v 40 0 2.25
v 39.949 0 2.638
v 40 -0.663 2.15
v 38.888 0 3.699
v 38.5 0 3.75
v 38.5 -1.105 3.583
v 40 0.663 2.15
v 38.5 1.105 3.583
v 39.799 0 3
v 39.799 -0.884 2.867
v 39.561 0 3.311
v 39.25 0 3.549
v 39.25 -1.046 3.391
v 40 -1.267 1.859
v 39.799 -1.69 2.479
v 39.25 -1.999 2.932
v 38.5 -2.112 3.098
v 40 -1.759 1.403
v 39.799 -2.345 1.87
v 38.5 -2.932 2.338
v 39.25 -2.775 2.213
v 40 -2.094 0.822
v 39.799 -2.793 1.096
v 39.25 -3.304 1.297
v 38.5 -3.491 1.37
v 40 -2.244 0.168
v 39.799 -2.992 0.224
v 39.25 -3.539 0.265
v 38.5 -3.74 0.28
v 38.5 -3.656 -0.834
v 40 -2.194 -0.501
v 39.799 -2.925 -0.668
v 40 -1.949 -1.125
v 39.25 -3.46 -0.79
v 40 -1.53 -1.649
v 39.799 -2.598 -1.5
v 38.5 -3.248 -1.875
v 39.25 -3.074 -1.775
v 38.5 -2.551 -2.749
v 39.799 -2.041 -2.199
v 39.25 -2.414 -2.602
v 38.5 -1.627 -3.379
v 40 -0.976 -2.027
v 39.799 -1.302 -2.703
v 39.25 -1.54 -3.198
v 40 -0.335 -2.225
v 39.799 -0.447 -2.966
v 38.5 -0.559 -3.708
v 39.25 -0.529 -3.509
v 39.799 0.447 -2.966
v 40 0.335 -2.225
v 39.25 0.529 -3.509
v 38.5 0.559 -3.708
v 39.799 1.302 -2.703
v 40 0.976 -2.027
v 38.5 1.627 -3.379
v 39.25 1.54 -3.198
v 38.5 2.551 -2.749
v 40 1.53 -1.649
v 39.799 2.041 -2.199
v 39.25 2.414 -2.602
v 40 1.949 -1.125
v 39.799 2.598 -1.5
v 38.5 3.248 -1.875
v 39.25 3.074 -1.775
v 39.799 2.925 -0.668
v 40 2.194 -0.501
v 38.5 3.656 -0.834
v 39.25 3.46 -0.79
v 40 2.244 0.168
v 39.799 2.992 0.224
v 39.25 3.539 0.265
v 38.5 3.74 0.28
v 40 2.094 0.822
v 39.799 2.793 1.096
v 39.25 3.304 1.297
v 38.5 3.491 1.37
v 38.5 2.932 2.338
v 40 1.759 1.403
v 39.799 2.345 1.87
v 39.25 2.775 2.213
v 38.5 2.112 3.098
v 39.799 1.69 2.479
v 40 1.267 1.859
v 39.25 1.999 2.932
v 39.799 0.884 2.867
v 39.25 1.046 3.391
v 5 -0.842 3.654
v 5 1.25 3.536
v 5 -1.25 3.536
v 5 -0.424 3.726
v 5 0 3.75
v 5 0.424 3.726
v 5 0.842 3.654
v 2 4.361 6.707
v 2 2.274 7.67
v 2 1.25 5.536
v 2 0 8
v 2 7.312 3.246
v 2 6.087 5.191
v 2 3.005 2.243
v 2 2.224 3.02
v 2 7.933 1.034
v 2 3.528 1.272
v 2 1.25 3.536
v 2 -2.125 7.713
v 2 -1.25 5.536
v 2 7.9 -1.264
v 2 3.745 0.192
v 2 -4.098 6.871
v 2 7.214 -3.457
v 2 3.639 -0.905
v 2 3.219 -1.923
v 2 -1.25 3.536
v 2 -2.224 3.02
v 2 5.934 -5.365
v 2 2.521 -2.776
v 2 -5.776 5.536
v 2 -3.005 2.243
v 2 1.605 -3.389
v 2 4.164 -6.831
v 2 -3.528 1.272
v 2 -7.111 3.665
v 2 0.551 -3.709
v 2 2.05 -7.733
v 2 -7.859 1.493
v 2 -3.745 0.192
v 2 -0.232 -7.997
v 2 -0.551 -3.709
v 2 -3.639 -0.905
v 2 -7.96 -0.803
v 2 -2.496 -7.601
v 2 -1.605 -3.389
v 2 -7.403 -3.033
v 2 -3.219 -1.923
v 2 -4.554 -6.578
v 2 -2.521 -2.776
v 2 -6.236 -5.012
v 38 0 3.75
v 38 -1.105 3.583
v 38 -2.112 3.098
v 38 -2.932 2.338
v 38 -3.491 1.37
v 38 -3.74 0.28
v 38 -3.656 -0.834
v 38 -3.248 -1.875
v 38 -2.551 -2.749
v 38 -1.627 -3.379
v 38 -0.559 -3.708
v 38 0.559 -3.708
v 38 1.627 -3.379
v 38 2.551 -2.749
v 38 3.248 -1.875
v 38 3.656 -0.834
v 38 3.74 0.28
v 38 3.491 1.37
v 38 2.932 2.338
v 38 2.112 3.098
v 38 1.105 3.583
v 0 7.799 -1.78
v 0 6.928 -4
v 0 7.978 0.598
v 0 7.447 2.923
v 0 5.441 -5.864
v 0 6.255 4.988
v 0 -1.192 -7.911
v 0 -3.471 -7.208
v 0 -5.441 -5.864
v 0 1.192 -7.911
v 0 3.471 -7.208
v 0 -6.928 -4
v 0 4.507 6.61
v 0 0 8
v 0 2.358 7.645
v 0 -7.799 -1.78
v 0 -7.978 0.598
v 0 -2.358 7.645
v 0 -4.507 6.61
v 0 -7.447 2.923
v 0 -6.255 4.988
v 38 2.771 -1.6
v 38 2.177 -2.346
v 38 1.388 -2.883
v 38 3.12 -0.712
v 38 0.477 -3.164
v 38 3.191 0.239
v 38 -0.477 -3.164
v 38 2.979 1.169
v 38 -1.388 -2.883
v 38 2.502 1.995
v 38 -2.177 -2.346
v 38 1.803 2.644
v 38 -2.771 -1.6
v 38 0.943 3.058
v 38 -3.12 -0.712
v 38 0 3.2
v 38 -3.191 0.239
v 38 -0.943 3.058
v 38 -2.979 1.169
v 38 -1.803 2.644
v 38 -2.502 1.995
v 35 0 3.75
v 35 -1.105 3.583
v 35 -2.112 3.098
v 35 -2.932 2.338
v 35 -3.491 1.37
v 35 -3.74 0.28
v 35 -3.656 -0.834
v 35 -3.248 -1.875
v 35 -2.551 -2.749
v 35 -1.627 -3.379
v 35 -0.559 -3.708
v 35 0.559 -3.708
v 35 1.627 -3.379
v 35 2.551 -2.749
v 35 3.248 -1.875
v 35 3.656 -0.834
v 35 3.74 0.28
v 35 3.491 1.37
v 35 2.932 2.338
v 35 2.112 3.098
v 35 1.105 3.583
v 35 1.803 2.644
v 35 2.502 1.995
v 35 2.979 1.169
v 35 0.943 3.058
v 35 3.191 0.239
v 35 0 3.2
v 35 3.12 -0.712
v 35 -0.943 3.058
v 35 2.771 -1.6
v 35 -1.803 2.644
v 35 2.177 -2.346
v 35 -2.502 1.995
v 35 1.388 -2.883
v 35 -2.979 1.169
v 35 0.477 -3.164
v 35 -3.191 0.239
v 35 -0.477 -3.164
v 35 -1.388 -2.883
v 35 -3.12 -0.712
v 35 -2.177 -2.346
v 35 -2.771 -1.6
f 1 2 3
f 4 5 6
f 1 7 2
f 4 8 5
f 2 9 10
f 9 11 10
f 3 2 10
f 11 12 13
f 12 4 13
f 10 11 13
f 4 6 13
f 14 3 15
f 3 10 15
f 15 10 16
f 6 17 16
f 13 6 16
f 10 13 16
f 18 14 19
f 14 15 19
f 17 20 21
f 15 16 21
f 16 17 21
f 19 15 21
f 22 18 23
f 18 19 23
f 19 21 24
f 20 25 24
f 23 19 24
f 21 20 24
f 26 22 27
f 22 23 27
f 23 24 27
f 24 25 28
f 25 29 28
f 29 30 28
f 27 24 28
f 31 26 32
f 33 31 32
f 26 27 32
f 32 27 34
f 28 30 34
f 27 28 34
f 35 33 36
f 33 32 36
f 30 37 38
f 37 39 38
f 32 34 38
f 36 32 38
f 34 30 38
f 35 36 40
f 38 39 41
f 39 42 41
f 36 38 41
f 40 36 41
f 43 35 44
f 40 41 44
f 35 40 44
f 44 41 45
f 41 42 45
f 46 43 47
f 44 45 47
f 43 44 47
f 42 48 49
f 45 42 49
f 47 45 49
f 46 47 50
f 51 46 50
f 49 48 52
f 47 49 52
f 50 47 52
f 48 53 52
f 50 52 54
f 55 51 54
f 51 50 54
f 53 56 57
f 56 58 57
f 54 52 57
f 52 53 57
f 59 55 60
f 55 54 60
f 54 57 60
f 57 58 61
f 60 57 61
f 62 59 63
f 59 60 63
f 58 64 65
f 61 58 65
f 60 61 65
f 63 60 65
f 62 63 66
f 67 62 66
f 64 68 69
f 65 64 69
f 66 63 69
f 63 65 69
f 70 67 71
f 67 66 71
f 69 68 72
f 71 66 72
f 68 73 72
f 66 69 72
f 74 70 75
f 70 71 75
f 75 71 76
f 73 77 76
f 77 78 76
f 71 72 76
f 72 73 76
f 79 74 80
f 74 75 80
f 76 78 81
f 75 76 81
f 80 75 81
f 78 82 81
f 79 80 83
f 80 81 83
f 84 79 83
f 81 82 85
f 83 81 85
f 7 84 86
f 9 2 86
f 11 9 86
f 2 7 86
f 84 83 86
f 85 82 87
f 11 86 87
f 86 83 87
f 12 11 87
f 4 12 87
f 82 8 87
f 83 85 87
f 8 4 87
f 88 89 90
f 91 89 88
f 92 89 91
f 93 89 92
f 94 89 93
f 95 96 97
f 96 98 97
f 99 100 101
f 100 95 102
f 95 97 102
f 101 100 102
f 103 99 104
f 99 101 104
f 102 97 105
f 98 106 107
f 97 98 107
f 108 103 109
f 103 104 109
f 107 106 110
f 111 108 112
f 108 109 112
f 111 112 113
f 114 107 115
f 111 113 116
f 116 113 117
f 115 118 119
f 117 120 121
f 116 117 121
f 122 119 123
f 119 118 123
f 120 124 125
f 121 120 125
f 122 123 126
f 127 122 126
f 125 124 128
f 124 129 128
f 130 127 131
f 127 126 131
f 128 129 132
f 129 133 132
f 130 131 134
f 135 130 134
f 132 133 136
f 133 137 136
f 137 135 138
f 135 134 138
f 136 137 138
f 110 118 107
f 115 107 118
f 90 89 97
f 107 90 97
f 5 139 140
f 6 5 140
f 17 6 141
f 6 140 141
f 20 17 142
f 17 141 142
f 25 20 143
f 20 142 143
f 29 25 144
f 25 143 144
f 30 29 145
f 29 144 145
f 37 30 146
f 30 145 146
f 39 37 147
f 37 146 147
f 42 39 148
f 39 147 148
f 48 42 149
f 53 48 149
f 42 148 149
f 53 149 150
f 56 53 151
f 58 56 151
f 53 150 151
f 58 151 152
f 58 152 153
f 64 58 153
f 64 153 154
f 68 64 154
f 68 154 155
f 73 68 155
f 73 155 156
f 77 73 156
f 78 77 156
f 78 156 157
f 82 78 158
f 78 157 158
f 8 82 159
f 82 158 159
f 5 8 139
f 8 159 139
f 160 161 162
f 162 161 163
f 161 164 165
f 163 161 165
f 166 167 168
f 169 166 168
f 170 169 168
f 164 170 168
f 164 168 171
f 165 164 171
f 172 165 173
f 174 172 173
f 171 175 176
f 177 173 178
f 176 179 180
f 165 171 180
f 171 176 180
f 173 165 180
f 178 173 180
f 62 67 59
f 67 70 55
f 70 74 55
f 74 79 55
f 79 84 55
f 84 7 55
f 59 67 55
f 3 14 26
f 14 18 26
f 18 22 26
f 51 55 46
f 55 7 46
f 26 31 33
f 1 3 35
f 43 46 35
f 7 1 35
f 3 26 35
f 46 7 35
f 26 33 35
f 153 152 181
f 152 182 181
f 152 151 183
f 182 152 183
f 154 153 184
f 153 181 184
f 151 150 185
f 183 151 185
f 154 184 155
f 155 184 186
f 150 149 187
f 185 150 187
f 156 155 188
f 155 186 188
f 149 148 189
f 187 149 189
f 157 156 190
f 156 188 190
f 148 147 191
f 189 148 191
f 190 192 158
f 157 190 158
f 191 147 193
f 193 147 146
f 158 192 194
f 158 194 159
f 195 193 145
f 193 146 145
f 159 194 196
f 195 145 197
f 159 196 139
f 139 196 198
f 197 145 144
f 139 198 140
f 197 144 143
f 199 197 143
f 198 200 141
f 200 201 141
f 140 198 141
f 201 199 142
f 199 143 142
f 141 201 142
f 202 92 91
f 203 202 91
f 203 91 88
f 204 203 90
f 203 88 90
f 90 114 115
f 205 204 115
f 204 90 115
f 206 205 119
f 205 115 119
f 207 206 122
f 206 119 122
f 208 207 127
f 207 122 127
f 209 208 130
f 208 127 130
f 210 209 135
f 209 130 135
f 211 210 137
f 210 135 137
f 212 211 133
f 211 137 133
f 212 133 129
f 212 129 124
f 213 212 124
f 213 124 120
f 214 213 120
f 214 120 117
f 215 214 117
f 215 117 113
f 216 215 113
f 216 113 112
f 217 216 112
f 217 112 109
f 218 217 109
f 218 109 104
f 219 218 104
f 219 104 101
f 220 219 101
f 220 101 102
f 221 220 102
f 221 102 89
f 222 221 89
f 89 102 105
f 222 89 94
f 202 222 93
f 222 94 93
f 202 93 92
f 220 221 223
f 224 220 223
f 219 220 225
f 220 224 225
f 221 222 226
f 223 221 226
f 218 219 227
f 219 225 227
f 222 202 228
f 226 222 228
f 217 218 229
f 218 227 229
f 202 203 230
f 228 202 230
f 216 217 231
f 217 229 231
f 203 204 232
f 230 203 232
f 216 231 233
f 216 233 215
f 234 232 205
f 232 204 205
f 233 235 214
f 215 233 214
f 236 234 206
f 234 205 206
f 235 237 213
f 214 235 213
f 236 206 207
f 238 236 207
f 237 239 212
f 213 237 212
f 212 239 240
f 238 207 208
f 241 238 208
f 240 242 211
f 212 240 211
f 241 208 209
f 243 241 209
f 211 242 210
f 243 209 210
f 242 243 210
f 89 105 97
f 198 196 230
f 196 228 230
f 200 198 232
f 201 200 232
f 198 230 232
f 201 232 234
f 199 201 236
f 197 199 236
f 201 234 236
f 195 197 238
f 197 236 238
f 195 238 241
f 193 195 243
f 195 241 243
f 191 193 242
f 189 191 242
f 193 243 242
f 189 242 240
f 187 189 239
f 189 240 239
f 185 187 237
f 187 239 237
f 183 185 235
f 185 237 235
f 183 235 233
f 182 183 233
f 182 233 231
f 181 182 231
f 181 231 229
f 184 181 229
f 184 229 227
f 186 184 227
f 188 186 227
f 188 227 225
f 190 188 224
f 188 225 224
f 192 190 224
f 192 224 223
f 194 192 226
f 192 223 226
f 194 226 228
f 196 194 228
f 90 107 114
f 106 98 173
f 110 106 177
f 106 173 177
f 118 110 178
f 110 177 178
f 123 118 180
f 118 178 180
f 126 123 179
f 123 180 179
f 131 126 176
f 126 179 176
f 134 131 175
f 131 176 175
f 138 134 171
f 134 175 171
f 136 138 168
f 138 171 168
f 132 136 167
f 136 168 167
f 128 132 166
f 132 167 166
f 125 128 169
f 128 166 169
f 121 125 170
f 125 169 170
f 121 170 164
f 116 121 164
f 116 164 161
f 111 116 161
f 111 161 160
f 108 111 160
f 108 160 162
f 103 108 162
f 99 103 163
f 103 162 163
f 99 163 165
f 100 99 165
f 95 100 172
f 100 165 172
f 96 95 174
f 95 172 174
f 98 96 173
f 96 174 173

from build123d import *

# Parameters (mm, degrees)
F2_R     = 1.5
F4_DEPTH = 3
F6_DEPTH = 25


with BuildPart() as f1:
    # F0 (on Front) → F1 (revolve)
    with BuildSketch(Plane.XZ):
        Polygon((0, 8), (0, 0), (40, 0), (40, 3.75), (38, 3.75), (38, 3.2), (35, 3.2), (35, 3.75), (2, 3.75), (2, 8), align=None)
    revolve(axis=Axis((20, 0, 0), (1, 0, 0)))

    # F2
    f2_edges = [f1.edges().sort_by_distance(p)[0] for p in [
        (40, 0, -3.75),
    ]]
    fillet(f2_edges, radius=F2_R)

    # F3 (on face) → F4 (join)
    with BuildSketch(Plane.YZ.offset(2)):
        with BuildLine():
            Line((-1.25, 5.535534), (-1.25, 3.535534))
            ThreePointArc((-1.25, 3.535534), (0, 3.75), (1.25, 3.535534))
            Line((1.25, 3.535534), (1.25, 5.535534))
            Line((1.25, 5.535534), (-1.25, 5.535534))
        make_face()
    extrude(amount=F4_DEPTH)

    # F5 (on face) → F6 (cut)
    with BuildSketch(Plane(origin=(0, 1.25, 0), x_dir=(-1, 0, 0), z_dir=(0, 1, 0))):
        Polygon((-5, 3.535534), (-2, 5.535534), (-5, 5.535534), align=None)
    extrude(amount=-F6_DEPTH, mode=Mode.SUBTRACT)


solid = f1.part
